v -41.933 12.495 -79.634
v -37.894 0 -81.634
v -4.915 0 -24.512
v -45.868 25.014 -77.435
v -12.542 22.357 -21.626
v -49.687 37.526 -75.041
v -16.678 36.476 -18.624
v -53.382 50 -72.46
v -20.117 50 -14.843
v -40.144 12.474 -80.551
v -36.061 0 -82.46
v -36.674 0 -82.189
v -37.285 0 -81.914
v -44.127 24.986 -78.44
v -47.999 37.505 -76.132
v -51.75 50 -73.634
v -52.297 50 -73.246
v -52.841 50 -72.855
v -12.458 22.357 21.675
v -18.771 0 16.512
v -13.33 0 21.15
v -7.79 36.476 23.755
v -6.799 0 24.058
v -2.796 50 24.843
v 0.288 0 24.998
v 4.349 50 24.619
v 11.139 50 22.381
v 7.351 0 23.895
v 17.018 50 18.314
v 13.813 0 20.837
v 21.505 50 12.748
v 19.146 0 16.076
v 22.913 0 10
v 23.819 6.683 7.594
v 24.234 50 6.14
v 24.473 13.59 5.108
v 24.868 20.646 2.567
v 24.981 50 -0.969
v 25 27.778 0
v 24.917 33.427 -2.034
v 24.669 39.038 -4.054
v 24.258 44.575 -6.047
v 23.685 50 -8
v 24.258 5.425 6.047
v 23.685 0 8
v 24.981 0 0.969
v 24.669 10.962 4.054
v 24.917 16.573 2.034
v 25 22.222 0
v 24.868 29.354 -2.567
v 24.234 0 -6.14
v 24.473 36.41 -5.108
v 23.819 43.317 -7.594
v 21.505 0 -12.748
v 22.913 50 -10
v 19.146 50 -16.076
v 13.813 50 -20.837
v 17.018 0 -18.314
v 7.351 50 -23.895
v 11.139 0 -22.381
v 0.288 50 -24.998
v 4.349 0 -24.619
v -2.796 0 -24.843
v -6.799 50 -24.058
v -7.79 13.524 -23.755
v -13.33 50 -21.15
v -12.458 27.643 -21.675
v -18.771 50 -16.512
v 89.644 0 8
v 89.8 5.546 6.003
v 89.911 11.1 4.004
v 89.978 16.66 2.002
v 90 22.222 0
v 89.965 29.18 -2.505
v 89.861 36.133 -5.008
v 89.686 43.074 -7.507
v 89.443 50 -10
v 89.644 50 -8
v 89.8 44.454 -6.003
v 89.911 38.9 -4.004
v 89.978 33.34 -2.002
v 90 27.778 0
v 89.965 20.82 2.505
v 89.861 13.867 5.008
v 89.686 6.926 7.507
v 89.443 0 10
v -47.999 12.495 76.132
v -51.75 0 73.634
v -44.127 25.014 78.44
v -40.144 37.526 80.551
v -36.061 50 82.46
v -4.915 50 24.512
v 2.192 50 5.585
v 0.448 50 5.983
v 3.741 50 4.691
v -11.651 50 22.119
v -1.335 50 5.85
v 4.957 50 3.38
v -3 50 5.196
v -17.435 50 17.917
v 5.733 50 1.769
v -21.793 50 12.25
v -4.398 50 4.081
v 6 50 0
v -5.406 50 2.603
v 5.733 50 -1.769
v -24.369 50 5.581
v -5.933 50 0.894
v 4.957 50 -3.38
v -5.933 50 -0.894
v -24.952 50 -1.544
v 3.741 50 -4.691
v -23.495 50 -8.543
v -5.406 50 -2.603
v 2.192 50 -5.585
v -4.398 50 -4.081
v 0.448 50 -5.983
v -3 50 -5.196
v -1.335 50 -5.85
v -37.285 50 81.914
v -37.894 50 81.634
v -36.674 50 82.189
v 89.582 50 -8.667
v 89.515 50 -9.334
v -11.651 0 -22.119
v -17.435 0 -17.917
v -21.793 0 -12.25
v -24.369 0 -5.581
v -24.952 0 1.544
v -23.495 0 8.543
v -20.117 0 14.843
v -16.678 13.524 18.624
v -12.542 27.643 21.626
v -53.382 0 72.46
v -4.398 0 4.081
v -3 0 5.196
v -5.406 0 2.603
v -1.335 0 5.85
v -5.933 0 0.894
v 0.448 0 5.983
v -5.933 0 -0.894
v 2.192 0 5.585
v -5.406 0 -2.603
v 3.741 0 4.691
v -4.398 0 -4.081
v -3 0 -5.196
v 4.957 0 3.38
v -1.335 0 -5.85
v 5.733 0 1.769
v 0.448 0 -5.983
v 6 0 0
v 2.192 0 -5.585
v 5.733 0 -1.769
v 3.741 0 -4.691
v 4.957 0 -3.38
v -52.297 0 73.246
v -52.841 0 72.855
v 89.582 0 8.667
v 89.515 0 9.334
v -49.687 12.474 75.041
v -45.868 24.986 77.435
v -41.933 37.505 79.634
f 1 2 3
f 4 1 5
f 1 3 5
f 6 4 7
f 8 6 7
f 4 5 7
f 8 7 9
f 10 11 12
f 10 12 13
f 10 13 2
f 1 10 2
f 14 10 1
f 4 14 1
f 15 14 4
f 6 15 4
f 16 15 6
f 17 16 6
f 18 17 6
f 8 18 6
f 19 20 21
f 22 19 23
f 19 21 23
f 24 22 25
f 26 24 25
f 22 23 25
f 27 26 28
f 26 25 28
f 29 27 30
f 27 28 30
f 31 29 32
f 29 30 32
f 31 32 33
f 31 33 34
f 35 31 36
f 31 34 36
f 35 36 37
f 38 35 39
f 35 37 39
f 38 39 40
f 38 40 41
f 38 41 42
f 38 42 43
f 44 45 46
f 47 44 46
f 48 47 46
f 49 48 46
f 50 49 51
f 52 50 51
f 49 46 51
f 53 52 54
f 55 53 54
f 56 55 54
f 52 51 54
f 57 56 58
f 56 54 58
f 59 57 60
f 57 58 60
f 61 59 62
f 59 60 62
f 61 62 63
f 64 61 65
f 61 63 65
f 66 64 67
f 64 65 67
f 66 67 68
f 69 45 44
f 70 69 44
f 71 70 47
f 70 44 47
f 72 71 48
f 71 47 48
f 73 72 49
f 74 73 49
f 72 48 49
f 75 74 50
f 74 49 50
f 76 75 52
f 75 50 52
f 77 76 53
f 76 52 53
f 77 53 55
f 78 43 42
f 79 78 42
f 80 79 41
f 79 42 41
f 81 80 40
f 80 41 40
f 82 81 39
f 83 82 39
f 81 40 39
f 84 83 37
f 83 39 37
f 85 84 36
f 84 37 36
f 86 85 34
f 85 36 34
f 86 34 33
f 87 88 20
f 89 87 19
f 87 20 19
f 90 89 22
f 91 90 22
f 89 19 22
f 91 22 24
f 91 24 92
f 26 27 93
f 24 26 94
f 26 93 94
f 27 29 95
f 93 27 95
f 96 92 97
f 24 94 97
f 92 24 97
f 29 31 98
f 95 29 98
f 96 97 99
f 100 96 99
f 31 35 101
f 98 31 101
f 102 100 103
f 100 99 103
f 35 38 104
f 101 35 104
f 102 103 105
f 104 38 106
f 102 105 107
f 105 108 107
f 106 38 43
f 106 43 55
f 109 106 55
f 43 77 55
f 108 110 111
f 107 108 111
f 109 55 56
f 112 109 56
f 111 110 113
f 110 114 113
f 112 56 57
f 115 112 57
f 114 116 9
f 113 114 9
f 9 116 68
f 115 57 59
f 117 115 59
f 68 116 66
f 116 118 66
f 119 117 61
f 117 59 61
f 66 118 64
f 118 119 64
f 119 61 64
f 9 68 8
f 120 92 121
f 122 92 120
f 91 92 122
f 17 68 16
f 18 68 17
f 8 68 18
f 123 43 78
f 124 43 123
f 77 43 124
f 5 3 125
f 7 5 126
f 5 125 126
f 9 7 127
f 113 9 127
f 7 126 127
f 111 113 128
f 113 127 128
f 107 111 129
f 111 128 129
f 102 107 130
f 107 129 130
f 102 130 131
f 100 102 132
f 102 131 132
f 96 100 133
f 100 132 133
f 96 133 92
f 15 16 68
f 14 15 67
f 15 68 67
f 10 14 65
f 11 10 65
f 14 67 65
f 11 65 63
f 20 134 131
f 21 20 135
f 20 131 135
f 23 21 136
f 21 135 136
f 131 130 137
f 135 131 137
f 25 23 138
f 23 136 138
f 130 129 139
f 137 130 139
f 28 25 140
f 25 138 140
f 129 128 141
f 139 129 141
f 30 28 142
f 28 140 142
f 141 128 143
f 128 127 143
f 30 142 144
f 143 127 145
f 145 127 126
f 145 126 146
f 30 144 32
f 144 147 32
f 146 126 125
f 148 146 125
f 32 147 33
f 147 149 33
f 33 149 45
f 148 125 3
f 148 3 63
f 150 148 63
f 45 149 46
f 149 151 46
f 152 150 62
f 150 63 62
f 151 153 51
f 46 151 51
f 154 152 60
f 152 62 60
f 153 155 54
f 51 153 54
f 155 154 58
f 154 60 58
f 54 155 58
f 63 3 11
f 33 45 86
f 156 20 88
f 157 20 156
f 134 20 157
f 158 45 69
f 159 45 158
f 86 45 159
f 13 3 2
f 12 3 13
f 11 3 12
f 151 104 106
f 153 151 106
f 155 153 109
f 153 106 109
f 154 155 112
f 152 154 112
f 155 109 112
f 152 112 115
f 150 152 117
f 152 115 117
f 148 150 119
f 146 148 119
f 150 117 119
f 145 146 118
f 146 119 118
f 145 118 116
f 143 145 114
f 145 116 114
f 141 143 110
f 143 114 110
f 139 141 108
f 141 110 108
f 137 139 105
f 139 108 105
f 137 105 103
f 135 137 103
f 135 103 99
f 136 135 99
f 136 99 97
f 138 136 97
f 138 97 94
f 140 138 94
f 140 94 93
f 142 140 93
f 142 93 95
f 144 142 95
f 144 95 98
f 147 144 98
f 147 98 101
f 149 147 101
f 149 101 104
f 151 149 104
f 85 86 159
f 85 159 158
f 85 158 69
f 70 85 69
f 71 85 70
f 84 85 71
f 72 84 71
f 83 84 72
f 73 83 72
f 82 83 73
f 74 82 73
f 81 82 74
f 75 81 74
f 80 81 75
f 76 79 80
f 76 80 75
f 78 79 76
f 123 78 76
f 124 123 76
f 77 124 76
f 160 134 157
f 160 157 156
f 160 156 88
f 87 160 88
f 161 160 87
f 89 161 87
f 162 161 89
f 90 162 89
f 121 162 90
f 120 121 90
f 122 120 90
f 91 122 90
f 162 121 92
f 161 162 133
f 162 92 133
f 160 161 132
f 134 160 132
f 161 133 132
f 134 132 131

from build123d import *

# Parameters (mm, degrees)
SKETCH2_R           = 25
BOSS_EXTRUDE1_DEPTH = 50
BOSS_EXTRUDE2_DEPTH = 100
CIRPATTERN1_COUNT   = 3
SKETCH5_R           = 150
SKETCH5_R_2         = 90
CUT_EXTRUDE3_DEPTH  = 51
SKETCH3_R           = 6
CUT_EXTRUDE1_DEPTH  = 51


with BuildPart() as part:
    # Sketch2 → Boss-Extrude1 (new body)
    with BuildSketch(Plane(origin=(0, 0, 0), x_dir=(1, 0, 0), z_dir=(0, 1, 0))):
        Circle(SKETCH2_R)
    extrude(amount=BOSS_EXTRUDE1_DEPTH)

    # Sketch4 → Boss-Extrude2 (add)
    with BuildSketch(Plane(origin=(0, 0, 0), x_dir=(0, 0, -1), z_dir=(1, 0, 0))):
        Polygon((10, 50), (8, 50), (-10, 0), (-8, 0), align=None)
    boss_extrude2 = extrude(amount=BOSS_EXTRUDE2_DEPTH)

    # CirPattern1: Boss-Extrude2 ×3 about axis
    cirpattern1_axis = Axis((0, 0, 0), (0, 1, 0))
    for i in range(1, CIRPATTERN1_COUNT):
        add(boss_extrude2.rotate(cirpattern1_axis, i * 360 / CIRPATTERN1_COUNT))

    # Sketch5 → Cut-Extrude3 (cut, through all)
    with BuildSketch(Plane(origin=(0, 50, 0), x_dir=(1, 0, 0), z_dir=(0, 1, 0))):
        Circle(SKETCH5_R)
        Circle(SKETCH5_R_2, mode=Mode.SUBTRACT)
    extrude(amount=-CUT_EXTRUDE3_DEPTH, mode=Mode.SUBTRACT)

    # Sketch3 → Cut-Extrude1 (cut, through all)
    with BuildSketch(Plane(origin=(0, 50, 0), x_dir=(1, 0, 0), z_dir=(0, 1, 0))):
        Circle(SKETCH3_R)
    extrude(amount=-CUT_EXTRUDE1_DEPTH, mode=Mode.SUBTRACT)


solid = part.part
